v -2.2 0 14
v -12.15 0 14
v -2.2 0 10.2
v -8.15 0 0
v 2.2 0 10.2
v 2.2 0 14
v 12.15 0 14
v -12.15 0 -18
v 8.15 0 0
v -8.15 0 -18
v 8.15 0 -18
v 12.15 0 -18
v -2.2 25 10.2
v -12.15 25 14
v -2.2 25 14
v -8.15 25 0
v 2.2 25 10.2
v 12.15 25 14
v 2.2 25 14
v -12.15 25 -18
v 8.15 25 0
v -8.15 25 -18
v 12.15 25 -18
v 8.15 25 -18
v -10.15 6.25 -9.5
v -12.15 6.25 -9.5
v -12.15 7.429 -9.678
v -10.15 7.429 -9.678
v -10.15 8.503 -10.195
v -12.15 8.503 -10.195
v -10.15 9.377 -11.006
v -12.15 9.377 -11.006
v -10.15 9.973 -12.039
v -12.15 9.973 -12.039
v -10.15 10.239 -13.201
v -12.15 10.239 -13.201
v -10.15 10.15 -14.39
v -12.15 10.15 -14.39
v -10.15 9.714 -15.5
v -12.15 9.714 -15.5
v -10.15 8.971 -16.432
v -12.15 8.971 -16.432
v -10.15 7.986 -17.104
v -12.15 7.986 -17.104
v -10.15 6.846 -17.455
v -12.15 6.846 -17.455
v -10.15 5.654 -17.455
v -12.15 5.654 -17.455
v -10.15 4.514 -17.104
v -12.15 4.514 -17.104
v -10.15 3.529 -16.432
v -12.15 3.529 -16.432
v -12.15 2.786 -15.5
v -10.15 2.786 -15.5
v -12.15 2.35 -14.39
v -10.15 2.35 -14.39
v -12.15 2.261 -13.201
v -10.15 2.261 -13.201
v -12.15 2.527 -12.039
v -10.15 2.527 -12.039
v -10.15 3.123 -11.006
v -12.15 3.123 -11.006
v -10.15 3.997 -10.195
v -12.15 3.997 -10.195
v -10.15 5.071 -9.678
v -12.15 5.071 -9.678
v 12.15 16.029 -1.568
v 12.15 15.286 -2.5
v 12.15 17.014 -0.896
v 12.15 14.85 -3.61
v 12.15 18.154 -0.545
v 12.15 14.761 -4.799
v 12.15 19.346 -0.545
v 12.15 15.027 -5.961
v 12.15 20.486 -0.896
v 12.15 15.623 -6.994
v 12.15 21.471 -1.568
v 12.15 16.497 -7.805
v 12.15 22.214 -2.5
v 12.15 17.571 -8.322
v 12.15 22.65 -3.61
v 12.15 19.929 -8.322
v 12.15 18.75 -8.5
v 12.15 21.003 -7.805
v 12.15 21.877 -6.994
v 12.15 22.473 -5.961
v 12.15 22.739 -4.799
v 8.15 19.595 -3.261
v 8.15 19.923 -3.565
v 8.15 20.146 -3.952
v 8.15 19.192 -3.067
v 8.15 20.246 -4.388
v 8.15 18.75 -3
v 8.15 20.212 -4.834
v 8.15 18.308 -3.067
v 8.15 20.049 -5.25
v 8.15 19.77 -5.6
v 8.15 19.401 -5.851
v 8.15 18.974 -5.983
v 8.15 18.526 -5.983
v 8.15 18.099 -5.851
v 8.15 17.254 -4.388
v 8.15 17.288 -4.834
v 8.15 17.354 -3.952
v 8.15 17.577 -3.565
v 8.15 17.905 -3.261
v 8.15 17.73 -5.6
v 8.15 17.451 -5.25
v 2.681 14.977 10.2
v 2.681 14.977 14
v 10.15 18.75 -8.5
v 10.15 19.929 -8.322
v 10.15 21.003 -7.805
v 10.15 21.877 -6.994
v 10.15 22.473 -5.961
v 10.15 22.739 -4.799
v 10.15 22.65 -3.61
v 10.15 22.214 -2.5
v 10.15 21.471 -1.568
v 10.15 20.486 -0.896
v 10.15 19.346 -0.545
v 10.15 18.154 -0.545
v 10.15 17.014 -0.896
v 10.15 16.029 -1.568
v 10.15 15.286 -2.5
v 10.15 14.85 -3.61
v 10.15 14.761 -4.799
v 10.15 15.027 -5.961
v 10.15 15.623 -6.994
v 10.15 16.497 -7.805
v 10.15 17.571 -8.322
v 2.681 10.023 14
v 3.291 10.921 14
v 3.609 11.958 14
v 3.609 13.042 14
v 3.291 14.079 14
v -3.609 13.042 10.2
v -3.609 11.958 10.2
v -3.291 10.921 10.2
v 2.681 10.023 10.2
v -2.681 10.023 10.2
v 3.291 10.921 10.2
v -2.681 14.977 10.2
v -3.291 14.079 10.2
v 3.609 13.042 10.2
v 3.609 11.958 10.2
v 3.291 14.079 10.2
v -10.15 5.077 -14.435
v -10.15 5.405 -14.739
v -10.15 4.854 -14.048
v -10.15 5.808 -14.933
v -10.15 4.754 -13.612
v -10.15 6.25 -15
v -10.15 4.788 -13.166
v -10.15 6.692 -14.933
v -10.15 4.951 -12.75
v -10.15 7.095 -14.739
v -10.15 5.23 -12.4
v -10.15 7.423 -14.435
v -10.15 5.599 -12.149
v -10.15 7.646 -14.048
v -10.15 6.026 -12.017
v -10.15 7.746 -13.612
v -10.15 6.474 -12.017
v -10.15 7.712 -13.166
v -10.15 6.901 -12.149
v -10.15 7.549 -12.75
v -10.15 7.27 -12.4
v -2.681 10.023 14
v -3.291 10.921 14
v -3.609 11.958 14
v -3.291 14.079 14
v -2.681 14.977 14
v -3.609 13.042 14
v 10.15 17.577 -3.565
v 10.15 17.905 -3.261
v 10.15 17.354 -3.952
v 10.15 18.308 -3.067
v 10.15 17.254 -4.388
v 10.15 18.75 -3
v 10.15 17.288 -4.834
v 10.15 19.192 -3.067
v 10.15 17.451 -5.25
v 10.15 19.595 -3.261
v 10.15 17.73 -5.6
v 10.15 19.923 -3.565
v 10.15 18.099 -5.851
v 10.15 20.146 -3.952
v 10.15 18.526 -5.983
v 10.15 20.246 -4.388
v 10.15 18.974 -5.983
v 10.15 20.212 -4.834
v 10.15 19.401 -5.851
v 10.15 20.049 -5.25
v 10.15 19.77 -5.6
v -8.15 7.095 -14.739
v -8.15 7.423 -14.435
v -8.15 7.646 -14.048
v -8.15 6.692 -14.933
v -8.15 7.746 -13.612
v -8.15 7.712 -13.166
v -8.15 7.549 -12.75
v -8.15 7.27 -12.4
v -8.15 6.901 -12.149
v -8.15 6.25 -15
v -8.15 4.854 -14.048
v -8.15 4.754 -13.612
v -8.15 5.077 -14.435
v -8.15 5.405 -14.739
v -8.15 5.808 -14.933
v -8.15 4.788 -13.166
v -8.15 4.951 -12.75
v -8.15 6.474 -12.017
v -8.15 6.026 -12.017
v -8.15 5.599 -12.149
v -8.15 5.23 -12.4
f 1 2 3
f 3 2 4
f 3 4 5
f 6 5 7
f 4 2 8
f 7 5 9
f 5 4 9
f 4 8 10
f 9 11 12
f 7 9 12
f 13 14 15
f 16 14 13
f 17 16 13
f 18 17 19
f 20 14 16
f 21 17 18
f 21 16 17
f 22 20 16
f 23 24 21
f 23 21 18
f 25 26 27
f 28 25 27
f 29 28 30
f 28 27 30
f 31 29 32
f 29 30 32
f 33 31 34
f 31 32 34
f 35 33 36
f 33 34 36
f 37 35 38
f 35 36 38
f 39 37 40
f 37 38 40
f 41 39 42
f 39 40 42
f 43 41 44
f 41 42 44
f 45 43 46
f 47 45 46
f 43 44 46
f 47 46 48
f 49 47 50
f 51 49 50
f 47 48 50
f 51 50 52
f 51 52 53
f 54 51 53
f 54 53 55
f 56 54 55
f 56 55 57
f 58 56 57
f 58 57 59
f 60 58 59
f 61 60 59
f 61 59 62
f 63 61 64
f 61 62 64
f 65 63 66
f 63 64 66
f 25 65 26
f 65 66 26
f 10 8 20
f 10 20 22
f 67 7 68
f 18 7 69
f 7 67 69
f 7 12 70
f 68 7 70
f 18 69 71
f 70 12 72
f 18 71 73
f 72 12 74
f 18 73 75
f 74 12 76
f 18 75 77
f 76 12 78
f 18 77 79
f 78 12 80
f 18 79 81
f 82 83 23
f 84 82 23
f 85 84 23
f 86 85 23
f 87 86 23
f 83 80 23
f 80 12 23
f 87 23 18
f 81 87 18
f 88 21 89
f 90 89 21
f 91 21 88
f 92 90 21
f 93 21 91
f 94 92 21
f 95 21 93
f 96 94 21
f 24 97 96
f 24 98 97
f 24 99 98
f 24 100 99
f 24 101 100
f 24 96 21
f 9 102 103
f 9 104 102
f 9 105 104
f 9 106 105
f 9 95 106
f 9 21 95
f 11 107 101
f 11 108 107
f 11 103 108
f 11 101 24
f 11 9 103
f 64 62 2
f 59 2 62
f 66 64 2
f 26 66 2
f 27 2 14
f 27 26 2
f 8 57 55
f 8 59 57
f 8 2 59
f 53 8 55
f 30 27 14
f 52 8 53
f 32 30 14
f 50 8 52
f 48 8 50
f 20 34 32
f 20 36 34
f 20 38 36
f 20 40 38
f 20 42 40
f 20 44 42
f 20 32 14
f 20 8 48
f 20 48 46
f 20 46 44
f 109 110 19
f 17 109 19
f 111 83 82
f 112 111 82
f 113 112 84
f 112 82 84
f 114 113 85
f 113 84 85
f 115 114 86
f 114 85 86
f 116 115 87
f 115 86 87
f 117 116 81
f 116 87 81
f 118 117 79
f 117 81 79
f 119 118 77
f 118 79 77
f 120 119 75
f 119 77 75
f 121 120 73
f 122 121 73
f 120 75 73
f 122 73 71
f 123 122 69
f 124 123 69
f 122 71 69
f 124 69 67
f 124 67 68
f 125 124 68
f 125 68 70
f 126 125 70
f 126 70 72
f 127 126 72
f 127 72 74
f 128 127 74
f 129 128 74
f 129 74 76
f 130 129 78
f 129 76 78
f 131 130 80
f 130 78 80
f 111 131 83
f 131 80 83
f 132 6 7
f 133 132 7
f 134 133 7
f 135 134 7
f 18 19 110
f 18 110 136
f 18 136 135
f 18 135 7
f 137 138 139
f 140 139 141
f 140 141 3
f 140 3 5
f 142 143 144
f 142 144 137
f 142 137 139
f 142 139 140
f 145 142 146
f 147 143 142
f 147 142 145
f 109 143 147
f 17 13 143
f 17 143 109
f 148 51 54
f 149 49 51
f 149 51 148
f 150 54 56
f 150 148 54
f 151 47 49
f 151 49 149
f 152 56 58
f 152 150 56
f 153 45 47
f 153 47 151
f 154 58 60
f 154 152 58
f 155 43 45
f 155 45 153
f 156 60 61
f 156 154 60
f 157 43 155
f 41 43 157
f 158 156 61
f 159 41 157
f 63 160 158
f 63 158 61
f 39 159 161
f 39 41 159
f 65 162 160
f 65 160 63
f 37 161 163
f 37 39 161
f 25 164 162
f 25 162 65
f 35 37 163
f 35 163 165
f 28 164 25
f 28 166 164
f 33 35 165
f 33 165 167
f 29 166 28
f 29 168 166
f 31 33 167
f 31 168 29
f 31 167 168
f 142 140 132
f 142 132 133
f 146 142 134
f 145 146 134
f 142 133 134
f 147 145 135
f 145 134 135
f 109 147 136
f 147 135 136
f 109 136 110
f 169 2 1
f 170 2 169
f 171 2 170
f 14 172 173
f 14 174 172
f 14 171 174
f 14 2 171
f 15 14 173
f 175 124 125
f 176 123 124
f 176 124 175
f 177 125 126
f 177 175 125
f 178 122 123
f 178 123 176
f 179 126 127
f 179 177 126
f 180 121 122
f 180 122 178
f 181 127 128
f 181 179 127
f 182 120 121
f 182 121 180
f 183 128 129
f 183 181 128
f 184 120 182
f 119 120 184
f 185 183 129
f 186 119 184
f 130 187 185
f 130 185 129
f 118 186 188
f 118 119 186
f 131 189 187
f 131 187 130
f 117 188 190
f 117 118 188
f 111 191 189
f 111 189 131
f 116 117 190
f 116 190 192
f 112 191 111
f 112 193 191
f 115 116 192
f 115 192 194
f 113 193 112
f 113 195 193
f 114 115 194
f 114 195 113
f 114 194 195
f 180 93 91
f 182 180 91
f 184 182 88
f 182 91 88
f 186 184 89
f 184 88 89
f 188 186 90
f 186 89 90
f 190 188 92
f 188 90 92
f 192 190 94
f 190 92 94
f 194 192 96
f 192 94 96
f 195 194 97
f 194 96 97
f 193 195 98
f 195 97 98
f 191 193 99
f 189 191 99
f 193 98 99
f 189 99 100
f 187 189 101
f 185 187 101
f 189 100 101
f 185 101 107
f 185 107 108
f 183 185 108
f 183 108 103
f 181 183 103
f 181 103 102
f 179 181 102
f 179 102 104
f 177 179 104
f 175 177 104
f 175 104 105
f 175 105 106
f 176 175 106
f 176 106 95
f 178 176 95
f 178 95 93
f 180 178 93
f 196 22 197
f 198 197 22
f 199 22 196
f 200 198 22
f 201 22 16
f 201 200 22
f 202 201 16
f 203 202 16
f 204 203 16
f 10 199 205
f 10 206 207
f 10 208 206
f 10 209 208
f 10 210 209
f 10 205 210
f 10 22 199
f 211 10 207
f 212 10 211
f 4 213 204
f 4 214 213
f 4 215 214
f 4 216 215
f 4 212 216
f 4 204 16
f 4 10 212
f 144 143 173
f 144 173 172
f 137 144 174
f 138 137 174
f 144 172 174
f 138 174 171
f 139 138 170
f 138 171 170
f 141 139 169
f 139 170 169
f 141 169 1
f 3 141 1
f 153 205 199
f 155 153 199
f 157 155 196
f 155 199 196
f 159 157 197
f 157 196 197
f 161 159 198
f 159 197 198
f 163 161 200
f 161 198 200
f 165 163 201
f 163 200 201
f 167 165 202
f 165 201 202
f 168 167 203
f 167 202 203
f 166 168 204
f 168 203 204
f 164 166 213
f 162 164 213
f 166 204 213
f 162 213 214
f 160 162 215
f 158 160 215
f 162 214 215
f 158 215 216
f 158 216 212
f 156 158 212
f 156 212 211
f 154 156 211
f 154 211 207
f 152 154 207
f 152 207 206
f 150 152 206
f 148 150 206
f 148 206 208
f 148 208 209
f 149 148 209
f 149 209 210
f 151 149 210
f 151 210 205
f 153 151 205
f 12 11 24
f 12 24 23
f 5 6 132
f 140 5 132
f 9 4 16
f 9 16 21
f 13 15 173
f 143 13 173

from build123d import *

# Parameters (mm, degrees)
EXTRUDE_THIN1_DEPTH = 25
SKETCH2_W           = 24.3
SKETCH2_H           = 25
BOSS_EXTRUDE1_DEPTH = 10
CUT_EXTRUDE1_DEPTH  = 3.8
SKETCH4_R           = 3.65
CUT_EXTRUDE2_DEPTH  = 3.8
SKETCH5_R           = 1.5
CUT_EXTRUDE3_DEPTH  = 37.892953257
SKETCH7_R           = 1.5
CUT_EXTRUDE4_DEPTH  = 37.892953257
SKETCH8_R           = 4
CUT_EXTRUDE5_DEPTH  = 2
SKETCH9_R           = 4
CUT_EXTRUDE6_DEPTH  = 2


with BuildPart() as part:
    # Sketch1 → Extrude-Thin1 (new body)
    with BuildSketch(Plane(origin=(0, 0, 0), x_dir=(1, 0, 0), z_dir=(0, 1, 0))):
        Polygon((-8.15, 18), (-8.15, 0), (8.15, 0), (8.15, 18), (12.15, 18), (12.15, -4), (-12.15, -4), (-12.15, 18), align=None)
    extrude(amount=EXTRUDE_THIN1_DEPTH)

    # Sketch2 → Boss-Extrude1 (add)
    with BuildSketch(Plane.XY.offset(4)):
        with Locations((0, 12.5)):
            Rectangle(SKETCH2_W, SKETCH2_H)
    extrude(amount=BOSS_EXTRUDE1_DEPTH)

    # Sketch3 → Cut-Extrude1 (cut)
    with BuildSketch(Plane.XY.offset(14)):
        with BuildLine():
            Line((-2.2, 25), (-2.8, 12.5))
            Line((-2.8, 12.5), (-2.2, 0))
            ThreePointArc((-2.2, 0), (0, -2.096932942), (2.2, 0))
            Line((2.2, 0), (2.8, 12.5))
            Line((2.8, 12.5), (2.2, 25))
            ThreePointArc((2.2, 25), (0, 27.096932942), (-2.2, 25))
        make_face()
    extrude(amount=-CUT_EXTRUDE1_DEPTH, mode=Mode.SUBTRACT)

    # Sketch4 → Cut-Extrude2 (cut)
    with BuildSketch(Plane.XY.offset(14)):
        with Locations((0, 12.5)):
            Circle(SKETCH4_R)
    extrude(amount=-CUT_EXTRUDE2_DEPTH, mode=Mode.SUBTRACT)

    # Sketch5 → Cut-Extrude3 (cut, through all)
    with BuildSketch(Plane.ZY.offset(-8.15)):
        with Locations((-4.5, 18.75)):
            Circle(SKETCH5_R)
    extrude(amount=-CUT_EXTRUDE3_DEPTH, mode=Mode.SUBTRACT)

    # Sketch7 → Cut-Extrude4 (cut, through all)
    with BuildSketch(Plane(origin=(-8.15, 0, 0), x_dir=(0, 0, -1), z_dir=(1, 0, 0))):
        with Locations((13.5, 6.25)):
            Circle(SKETCH7_R)
    extrude(amount=-CUT_EXTRUDE4_DEPTH, mode=Mode.SUBTRACT)

    # Sketch8 → Cut-Extrude5 (cut)
    with BuildSketch(Plane(origin=(12.15, 0, 0), x_dir=(0, 0, -1), z_dir=(1, 0, 0))):
        with Locations((4.5, 18.75)):
            Circle(SKETCH8_R)
    extrude(amount=-CUT_EXTRUDE5_DEPTH, mode=Mode.SUBTRACT)

    # Sketch9 → Cut-Extrude6 (cut)
    with BuildSketch(Plane.ZY.offset(12.15)):
        with Locations((-13.5, 6.25)):
            Circle(SKETCH9_R)
    extrude(amount=-CUT_EXTRUDE6_DEPTH, mode=Mode.SUBTRACT)


solid = part.part
